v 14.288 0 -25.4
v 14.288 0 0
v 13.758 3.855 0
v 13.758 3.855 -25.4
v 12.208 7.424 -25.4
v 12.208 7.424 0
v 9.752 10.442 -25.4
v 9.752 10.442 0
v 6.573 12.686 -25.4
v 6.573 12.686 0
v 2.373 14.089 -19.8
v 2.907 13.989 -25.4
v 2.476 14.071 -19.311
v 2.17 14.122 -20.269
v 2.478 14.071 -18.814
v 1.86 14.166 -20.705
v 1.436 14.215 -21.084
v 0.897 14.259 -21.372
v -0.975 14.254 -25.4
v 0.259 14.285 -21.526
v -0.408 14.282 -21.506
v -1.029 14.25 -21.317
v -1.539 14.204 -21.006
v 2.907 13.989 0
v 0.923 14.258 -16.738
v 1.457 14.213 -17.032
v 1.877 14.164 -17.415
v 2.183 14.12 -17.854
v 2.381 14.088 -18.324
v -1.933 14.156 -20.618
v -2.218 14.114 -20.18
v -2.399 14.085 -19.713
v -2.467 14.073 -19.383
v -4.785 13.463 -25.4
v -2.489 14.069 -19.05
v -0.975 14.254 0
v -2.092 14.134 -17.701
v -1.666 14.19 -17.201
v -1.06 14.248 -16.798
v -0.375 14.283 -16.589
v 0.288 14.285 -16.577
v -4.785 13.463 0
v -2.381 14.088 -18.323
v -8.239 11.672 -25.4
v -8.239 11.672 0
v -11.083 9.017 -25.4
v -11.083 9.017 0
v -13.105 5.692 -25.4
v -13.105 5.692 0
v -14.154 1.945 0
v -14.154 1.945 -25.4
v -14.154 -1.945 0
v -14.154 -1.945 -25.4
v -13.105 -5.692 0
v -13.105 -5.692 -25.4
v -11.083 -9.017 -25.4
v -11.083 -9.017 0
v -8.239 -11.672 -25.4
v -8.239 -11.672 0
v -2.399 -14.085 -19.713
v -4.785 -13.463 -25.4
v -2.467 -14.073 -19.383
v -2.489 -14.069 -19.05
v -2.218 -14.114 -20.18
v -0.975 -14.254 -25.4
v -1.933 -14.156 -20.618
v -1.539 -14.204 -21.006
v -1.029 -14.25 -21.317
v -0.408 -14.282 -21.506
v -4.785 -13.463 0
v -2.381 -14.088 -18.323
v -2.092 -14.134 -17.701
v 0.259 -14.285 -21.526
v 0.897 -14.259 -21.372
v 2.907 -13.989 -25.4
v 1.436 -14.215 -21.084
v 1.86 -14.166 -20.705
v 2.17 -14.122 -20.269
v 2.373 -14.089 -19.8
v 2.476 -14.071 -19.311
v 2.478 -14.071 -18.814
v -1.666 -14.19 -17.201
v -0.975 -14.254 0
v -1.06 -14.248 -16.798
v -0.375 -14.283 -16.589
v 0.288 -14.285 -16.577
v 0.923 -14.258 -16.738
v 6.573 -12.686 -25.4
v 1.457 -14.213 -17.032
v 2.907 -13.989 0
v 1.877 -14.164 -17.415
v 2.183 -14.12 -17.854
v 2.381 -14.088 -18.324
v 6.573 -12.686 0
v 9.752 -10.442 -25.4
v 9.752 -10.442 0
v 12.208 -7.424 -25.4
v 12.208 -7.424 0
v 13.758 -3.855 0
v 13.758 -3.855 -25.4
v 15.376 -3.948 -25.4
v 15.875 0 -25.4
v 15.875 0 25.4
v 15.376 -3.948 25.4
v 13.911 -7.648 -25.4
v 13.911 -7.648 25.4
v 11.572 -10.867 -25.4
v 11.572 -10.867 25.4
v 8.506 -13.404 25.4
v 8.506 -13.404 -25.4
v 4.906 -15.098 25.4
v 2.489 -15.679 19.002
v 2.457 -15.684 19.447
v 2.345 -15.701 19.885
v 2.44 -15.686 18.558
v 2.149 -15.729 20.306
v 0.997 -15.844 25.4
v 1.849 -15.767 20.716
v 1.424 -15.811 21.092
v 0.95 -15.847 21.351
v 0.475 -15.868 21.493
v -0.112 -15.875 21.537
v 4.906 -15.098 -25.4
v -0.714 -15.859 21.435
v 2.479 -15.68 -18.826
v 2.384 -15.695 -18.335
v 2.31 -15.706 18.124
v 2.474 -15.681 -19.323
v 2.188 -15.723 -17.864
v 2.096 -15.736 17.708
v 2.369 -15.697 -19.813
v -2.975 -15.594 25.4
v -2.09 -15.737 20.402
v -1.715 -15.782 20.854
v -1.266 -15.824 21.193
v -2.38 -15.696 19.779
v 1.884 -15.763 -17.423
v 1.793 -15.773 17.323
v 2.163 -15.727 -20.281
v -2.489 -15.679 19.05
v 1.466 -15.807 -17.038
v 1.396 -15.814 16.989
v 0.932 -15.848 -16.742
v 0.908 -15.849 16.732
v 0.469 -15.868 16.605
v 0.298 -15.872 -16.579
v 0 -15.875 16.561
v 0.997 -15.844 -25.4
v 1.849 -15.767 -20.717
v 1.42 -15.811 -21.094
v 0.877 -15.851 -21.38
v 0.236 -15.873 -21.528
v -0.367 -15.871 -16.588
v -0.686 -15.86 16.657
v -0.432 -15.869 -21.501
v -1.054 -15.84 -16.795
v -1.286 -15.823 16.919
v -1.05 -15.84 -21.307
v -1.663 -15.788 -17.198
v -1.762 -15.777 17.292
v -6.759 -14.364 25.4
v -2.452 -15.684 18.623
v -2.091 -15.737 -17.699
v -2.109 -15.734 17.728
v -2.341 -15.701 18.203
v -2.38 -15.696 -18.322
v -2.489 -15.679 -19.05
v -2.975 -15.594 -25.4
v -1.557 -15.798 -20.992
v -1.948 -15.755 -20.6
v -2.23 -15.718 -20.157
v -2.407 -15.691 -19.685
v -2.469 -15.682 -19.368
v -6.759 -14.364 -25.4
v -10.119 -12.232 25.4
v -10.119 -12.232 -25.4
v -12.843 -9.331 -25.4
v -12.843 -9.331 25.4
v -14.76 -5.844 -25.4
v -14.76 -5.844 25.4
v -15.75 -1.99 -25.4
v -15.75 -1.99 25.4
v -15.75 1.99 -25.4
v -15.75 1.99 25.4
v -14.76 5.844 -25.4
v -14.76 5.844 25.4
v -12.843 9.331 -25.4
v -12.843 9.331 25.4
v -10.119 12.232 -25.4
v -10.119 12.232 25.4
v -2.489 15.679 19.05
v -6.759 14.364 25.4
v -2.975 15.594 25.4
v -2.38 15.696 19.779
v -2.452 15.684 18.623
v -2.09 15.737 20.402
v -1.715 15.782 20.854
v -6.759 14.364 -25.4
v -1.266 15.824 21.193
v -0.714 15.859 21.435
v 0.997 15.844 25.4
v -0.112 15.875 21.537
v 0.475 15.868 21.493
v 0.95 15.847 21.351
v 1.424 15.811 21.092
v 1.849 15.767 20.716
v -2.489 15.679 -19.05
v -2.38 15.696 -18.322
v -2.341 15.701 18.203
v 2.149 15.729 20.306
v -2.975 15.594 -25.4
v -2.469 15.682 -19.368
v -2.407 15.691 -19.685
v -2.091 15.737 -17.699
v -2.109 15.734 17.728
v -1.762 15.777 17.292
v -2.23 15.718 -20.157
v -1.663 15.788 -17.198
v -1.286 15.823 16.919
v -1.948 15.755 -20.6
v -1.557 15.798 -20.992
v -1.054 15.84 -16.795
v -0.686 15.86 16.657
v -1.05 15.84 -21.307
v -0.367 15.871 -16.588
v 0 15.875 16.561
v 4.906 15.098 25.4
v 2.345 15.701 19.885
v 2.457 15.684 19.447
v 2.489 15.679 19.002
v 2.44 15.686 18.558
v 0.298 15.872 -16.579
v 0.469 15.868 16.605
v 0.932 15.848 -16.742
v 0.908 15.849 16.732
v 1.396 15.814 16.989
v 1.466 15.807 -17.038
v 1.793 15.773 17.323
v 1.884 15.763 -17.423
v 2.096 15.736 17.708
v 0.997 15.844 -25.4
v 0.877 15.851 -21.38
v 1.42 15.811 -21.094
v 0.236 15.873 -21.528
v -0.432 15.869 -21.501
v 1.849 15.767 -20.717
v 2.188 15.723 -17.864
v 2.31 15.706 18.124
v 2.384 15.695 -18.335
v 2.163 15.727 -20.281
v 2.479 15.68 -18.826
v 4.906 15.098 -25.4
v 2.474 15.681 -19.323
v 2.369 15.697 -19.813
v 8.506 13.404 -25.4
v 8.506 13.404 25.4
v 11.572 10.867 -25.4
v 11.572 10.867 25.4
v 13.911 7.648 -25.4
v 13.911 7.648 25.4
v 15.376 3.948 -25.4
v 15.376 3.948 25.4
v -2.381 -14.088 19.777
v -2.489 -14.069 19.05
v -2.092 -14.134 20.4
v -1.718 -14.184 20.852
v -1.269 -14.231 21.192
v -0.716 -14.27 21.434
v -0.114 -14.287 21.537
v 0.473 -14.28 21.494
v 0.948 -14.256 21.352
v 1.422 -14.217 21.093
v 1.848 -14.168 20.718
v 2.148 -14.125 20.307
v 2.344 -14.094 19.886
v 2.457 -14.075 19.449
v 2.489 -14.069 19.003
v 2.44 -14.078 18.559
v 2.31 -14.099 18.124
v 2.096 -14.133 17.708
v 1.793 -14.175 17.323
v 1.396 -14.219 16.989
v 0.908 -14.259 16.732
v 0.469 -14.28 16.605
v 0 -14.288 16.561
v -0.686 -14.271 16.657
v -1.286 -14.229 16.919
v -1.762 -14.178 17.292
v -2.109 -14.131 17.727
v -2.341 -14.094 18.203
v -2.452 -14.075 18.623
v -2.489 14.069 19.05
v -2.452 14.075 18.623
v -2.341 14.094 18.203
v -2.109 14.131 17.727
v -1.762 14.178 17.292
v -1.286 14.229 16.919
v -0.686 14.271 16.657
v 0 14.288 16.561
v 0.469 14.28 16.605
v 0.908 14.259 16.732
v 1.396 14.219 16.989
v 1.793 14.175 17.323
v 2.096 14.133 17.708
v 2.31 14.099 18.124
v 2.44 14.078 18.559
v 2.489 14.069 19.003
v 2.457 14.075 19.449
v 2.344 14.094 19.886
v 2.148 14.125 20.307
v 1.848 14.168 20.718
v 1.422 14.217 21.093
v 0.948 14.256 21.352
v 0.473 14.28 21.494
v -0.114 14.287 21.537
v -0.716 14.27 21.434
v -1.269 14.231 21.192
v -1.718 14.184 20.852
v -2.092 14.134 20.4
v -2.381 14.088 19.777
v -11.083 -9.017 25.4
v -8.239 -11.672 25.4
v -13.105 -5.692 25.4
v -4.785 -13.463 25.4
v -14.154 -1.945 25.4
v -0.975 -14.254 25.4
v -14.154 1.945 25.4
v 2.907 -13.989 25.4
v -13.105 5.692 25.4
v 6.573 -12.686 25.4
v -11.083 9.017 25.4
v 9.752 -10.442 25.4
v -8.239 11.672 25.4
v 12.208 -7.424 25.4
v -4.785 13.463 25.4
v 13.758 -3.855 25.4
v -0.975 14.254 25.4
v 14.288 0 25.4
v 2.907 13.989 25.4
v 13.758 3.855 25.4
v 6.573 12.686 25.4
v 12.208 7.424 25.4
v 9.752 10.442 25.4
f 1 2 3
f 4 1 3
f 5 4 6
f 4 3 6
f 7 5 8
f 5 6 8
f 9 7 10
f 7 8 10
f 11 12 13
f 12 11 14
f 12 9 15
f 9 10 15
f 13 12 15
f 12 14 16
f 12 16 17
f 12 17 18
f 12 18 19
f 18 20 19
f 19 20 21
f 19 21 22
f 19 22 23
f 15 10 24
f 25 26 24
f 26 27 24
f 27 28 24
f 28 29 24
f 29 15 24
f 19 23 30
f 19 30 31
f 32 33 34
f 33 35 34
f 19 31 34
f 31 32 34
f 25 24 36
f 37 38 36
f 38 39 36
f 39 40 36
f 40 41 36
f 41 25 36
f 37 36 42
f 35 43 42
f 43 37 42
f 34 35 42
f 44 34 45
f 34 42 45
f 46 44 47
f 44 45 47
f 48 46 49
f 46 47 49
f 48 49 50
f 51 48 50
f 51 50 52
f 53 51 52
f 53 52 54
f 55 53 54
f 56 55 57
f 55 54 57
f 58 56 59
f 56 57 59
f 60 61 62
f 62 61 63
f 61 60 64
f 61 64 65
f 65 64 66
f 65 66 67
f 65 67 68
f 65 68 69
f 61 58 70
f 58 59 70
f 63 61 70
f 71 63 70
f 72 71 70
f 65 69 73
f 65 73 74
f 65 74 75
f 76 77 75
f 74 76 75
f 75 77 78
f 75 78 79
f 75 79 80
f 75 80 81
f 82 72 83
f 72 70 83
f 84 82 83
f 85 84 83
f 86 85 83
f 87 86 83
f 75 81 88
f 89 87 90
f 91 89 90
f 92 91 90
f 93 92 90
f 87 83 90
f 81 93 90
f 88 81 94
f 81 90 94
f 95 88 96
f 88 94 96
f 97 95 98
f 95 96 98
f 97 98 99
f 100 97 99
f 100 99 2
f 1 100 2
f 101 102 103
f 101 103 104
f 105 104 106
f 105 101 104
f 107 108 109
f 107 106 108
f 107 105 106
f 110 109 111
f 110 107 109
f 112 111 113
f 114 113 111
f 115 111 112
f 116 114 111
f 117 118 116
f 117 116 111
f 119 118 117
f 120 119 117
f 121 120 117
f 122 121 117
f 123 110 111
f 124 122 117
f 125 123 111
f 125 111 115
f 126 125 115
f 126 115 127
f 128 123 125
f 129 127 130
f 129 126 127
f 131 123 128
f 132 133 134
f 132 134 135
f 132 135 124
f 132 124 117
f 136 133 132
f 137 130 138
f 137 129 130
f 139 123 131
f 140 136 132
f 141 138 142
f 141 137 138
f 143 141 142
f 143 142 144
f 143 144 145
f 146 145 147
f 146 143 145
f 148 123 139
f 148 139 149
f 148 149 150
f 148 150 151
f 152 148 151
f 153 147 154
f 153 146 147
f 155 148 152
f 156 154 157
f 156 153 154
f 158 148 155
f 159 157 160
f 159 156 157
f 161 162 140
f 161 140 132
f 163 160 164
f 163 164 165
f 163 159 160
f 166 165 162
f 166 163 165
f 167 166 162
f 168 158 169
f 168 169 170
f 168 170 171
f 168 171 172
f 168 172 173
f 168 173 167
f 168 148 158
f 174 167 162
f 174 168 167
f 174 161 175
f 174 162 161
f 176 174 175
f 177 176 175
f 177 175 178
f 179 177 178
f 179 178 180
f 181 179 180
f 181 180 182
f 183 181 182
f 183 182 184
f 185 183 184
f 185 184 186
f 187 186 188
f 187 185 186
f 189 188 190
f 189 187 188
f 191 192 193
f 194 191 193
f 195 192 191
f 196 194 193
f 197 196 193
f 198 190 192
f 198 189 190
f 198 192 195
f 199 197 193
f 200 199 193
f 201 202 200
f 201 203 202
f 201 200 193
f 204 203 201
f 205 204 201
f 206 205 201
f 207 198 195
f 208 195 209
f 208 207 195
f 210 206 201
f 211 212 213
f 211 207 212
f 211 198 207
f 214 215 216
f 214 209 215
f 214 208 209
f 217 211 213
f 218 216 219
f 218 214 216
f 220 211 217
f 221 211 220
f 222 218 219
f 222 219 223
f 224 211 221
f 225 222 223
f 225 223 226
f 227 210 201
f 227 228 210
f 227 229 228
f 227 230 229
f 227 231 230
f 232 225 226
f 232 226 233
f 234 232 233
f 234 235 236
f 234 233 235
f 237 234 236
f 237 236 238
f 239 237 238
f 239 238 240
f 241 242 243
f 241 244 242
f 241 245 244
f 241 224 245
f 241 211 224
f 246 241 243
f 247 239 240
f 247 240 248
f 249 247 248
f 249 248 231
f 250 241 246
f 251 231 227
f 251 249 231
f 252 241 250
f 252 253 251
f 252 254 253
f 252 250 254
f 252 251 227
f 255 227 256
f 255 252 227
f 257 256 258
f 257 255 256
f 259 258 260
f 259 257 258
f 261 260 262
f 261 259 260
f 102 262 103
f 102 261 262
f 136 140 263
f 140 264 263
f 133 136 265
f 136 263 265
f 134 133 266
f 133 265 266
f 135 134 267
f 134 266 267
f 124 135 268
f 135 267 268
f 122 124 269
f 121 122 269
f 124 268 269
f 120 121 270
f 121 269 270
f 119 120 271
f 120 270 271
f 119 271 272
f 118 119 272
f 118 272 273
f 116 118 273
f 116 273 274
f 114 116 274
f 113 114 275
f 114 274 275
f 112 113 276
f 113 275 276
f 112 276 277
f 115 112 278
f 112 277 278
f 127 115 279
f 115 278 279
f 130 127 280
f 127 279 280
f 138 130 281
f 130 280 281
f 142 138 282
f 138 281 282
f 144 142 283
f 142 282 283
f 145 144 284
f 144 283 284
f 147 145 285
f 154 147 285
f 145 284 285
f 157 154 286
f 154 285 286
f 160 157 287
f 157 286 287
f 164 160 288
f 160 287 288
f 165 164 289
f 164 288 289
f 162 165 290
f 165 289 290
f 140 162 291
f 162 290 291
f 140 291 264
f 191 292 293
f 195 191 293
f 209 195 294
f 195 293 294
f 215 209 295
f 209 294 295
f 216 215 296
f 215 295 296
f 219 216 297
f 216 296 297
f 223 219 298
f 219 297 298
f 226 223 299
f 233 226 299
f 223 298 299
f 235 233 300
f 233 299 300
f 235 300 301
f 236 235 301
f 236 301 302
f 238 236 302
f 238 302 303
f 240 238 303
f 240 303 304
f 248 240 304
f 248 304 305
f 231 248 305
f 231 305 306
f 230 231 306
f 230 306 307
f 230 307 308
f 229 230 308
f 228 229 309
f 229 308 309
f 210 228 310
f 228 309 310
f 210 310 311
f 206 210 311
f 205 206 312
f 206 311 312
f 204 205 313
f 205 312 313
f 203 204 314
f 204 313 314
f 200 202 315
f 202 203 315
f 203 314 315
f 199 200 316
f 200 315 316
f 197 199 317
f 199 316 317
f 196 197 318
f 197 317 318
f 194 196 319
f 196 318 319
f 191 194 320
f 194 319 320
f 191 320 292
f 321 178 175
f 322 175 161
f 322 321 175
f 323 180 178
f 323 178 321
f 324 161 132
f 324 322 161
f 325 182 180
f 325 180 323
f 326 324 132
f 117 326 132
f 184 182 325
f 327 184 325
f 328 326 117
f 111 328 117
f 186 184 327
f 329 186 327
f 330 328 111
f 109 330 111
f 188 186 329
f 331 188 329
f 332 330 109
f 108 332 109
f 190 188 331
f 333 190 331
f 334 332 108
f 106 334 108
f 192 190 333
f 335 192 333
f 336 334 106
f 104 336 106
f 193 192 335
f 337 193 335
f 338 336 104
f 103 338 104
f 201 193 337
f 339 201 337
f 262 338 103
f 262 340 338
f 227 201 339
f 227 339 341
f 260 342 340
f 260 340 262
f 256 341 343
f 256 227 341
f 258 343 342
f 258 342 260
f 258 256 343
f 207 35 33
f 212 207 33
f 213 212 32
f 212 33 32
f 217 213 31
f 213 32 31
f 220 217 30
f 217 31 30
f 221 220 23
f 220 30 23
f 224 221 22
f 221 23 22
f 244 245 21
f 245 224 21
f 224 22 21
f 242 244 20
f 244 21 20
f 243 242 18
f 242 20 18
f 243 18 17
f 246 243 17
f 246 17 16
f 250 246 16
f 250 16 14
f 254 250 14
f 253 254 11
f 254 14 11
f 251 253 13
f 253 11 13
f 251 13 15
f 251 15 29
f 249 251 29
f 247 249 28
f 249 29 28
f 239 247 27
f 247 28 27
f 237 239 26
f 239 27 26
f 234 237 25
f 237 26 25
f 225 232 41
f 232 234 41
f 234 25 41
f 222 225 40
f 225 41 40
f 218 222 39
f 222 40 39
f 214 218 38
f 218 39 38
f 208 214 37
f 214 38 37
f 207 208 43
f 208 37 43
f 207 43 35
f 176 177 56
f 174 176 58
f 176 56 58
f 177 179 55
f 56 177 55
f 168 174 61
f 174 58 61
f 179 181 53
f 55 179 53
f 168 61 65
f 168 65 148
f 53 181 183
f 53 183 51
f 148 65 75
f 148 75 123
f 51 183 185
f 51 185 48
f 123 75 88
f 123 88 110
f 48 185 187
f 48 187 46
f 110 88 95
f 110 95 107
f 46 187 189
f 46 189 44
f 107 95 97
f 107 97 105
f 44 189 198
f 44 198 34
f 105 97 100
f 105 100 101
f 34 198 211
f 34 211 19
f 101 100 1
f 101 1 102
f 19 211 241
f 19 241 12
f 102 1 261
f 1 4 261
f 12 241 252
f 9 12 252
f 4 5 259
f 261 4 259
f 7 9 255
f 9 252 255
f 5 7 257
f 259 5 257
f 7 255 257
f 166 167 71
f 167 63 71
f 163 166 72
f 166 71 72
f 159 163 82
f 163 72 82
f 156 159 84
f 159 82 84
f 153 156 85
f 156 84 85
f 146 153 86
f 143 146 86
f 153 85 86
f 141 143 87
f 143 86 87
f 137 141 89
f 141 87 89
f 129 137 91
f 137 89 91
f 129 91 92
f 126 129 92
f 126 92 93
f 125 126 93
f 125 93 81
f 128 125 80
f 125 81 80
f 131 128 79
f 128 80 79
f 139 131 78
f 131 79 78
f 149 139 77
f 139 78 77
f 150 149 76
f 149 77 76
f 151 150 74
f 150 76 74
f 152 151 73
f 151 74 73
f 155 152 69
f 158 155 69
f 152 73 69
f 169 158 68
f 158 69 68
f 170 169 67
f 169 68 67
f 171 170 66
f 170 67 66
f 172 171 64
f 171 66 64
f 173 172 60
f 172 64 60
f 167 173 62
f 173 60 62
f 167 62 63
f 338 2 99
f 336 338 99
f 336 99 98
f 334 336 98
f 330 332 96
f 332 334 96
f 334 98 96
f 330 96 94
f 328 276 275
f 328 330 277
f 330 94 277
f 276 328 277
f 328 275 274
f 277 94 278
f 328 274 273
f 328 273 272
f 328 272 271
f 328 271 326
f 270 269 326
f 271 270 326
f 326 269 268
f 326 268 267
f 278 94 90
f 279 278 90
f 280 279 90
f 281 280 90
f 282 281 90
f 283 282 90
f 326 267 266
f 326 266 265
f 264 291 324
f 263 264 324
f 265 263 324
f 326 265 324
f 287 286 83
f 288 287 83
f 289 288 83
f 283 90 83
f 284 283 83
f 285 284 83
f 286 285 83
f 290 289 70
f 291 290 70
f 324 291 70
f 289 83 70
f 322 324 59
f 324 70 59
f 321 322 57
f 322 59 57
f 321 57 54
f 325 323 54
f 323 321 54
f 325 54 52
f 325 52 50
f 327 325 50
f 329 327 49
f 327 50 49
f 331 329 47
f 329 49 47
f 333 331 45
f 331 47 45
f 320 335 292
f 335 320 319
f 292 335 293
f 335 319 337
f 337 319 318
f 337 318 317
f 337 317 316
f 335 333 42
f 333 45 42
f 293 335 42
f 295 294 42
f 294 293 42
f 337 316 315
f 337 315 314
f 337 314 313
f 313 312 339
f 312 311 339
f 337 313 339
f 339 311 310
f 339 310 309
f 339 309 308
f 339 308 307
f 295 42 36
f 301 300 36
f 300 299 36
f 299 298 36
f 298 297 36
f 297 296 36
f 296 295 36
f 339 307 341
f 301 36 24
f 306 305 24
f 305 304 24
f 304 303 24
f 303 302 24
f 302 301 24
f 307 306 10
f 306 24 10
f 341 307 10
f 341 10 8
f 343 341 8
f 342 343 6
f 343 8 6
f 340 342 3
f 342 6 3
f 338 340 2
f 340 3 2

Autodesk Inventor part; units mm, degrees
ref_plane "YZ Plane" through (0, 0, 0) normal (1, 0, 0) x (0, 1, 0)
ref_plane "XZ Plane" through (0, 0, 0) normal (0, 1, 0) x (-1, 0, 0)
ref_plane "XY Plane" through (0, 0, 0) normal (0, 0, 1) x (1, 0, 0)
sketch "Sketch16" plane through (0, 0, 0) normal (0, 0, 1) x (1, 0, 0)
  circle A0 centre (0, 0) radius 14.2875
  circle A1 centre (0, 0) radius 15.875
  dimension "d197" = 28.575
  dimension "d198" = 31.75
extrude "Extrusion1" add sketch "Sketch16" along normal mid plane 50.8
sketch "Sketch17" plane through (0, 0, 0) normal (0, 1, 0) x (-1, 0, 0)
  line L0 (-15.875, -25.4) -> (15.875, -25.4) projected
  line L1 (0, 0) -> (0, 19.05)
  circle A0 centre (0, 19.05) radius 2.4892
  line L2 (15.875, 25.4) -> (-15.875, 25.4) projected
  line L3 (-22.225, 0) -> (22.225, 0) projected
  circle A1 centre (0, -19.05) radius 2.4892
  point P0 (15.875, -25.4)
  dimension "d202" = 4.9784
  dimension "d205" = 6.35
extrude "Extrusion2" cut sketch "Sketch17" along normal mid plane 50.8 contours A0
extrude "Extrusion3" cut sketch "Sketch17" along normal mid plane 50.8 contours A1
properties part number "VersaRollerTestPart" material "Aluminum 6061"
